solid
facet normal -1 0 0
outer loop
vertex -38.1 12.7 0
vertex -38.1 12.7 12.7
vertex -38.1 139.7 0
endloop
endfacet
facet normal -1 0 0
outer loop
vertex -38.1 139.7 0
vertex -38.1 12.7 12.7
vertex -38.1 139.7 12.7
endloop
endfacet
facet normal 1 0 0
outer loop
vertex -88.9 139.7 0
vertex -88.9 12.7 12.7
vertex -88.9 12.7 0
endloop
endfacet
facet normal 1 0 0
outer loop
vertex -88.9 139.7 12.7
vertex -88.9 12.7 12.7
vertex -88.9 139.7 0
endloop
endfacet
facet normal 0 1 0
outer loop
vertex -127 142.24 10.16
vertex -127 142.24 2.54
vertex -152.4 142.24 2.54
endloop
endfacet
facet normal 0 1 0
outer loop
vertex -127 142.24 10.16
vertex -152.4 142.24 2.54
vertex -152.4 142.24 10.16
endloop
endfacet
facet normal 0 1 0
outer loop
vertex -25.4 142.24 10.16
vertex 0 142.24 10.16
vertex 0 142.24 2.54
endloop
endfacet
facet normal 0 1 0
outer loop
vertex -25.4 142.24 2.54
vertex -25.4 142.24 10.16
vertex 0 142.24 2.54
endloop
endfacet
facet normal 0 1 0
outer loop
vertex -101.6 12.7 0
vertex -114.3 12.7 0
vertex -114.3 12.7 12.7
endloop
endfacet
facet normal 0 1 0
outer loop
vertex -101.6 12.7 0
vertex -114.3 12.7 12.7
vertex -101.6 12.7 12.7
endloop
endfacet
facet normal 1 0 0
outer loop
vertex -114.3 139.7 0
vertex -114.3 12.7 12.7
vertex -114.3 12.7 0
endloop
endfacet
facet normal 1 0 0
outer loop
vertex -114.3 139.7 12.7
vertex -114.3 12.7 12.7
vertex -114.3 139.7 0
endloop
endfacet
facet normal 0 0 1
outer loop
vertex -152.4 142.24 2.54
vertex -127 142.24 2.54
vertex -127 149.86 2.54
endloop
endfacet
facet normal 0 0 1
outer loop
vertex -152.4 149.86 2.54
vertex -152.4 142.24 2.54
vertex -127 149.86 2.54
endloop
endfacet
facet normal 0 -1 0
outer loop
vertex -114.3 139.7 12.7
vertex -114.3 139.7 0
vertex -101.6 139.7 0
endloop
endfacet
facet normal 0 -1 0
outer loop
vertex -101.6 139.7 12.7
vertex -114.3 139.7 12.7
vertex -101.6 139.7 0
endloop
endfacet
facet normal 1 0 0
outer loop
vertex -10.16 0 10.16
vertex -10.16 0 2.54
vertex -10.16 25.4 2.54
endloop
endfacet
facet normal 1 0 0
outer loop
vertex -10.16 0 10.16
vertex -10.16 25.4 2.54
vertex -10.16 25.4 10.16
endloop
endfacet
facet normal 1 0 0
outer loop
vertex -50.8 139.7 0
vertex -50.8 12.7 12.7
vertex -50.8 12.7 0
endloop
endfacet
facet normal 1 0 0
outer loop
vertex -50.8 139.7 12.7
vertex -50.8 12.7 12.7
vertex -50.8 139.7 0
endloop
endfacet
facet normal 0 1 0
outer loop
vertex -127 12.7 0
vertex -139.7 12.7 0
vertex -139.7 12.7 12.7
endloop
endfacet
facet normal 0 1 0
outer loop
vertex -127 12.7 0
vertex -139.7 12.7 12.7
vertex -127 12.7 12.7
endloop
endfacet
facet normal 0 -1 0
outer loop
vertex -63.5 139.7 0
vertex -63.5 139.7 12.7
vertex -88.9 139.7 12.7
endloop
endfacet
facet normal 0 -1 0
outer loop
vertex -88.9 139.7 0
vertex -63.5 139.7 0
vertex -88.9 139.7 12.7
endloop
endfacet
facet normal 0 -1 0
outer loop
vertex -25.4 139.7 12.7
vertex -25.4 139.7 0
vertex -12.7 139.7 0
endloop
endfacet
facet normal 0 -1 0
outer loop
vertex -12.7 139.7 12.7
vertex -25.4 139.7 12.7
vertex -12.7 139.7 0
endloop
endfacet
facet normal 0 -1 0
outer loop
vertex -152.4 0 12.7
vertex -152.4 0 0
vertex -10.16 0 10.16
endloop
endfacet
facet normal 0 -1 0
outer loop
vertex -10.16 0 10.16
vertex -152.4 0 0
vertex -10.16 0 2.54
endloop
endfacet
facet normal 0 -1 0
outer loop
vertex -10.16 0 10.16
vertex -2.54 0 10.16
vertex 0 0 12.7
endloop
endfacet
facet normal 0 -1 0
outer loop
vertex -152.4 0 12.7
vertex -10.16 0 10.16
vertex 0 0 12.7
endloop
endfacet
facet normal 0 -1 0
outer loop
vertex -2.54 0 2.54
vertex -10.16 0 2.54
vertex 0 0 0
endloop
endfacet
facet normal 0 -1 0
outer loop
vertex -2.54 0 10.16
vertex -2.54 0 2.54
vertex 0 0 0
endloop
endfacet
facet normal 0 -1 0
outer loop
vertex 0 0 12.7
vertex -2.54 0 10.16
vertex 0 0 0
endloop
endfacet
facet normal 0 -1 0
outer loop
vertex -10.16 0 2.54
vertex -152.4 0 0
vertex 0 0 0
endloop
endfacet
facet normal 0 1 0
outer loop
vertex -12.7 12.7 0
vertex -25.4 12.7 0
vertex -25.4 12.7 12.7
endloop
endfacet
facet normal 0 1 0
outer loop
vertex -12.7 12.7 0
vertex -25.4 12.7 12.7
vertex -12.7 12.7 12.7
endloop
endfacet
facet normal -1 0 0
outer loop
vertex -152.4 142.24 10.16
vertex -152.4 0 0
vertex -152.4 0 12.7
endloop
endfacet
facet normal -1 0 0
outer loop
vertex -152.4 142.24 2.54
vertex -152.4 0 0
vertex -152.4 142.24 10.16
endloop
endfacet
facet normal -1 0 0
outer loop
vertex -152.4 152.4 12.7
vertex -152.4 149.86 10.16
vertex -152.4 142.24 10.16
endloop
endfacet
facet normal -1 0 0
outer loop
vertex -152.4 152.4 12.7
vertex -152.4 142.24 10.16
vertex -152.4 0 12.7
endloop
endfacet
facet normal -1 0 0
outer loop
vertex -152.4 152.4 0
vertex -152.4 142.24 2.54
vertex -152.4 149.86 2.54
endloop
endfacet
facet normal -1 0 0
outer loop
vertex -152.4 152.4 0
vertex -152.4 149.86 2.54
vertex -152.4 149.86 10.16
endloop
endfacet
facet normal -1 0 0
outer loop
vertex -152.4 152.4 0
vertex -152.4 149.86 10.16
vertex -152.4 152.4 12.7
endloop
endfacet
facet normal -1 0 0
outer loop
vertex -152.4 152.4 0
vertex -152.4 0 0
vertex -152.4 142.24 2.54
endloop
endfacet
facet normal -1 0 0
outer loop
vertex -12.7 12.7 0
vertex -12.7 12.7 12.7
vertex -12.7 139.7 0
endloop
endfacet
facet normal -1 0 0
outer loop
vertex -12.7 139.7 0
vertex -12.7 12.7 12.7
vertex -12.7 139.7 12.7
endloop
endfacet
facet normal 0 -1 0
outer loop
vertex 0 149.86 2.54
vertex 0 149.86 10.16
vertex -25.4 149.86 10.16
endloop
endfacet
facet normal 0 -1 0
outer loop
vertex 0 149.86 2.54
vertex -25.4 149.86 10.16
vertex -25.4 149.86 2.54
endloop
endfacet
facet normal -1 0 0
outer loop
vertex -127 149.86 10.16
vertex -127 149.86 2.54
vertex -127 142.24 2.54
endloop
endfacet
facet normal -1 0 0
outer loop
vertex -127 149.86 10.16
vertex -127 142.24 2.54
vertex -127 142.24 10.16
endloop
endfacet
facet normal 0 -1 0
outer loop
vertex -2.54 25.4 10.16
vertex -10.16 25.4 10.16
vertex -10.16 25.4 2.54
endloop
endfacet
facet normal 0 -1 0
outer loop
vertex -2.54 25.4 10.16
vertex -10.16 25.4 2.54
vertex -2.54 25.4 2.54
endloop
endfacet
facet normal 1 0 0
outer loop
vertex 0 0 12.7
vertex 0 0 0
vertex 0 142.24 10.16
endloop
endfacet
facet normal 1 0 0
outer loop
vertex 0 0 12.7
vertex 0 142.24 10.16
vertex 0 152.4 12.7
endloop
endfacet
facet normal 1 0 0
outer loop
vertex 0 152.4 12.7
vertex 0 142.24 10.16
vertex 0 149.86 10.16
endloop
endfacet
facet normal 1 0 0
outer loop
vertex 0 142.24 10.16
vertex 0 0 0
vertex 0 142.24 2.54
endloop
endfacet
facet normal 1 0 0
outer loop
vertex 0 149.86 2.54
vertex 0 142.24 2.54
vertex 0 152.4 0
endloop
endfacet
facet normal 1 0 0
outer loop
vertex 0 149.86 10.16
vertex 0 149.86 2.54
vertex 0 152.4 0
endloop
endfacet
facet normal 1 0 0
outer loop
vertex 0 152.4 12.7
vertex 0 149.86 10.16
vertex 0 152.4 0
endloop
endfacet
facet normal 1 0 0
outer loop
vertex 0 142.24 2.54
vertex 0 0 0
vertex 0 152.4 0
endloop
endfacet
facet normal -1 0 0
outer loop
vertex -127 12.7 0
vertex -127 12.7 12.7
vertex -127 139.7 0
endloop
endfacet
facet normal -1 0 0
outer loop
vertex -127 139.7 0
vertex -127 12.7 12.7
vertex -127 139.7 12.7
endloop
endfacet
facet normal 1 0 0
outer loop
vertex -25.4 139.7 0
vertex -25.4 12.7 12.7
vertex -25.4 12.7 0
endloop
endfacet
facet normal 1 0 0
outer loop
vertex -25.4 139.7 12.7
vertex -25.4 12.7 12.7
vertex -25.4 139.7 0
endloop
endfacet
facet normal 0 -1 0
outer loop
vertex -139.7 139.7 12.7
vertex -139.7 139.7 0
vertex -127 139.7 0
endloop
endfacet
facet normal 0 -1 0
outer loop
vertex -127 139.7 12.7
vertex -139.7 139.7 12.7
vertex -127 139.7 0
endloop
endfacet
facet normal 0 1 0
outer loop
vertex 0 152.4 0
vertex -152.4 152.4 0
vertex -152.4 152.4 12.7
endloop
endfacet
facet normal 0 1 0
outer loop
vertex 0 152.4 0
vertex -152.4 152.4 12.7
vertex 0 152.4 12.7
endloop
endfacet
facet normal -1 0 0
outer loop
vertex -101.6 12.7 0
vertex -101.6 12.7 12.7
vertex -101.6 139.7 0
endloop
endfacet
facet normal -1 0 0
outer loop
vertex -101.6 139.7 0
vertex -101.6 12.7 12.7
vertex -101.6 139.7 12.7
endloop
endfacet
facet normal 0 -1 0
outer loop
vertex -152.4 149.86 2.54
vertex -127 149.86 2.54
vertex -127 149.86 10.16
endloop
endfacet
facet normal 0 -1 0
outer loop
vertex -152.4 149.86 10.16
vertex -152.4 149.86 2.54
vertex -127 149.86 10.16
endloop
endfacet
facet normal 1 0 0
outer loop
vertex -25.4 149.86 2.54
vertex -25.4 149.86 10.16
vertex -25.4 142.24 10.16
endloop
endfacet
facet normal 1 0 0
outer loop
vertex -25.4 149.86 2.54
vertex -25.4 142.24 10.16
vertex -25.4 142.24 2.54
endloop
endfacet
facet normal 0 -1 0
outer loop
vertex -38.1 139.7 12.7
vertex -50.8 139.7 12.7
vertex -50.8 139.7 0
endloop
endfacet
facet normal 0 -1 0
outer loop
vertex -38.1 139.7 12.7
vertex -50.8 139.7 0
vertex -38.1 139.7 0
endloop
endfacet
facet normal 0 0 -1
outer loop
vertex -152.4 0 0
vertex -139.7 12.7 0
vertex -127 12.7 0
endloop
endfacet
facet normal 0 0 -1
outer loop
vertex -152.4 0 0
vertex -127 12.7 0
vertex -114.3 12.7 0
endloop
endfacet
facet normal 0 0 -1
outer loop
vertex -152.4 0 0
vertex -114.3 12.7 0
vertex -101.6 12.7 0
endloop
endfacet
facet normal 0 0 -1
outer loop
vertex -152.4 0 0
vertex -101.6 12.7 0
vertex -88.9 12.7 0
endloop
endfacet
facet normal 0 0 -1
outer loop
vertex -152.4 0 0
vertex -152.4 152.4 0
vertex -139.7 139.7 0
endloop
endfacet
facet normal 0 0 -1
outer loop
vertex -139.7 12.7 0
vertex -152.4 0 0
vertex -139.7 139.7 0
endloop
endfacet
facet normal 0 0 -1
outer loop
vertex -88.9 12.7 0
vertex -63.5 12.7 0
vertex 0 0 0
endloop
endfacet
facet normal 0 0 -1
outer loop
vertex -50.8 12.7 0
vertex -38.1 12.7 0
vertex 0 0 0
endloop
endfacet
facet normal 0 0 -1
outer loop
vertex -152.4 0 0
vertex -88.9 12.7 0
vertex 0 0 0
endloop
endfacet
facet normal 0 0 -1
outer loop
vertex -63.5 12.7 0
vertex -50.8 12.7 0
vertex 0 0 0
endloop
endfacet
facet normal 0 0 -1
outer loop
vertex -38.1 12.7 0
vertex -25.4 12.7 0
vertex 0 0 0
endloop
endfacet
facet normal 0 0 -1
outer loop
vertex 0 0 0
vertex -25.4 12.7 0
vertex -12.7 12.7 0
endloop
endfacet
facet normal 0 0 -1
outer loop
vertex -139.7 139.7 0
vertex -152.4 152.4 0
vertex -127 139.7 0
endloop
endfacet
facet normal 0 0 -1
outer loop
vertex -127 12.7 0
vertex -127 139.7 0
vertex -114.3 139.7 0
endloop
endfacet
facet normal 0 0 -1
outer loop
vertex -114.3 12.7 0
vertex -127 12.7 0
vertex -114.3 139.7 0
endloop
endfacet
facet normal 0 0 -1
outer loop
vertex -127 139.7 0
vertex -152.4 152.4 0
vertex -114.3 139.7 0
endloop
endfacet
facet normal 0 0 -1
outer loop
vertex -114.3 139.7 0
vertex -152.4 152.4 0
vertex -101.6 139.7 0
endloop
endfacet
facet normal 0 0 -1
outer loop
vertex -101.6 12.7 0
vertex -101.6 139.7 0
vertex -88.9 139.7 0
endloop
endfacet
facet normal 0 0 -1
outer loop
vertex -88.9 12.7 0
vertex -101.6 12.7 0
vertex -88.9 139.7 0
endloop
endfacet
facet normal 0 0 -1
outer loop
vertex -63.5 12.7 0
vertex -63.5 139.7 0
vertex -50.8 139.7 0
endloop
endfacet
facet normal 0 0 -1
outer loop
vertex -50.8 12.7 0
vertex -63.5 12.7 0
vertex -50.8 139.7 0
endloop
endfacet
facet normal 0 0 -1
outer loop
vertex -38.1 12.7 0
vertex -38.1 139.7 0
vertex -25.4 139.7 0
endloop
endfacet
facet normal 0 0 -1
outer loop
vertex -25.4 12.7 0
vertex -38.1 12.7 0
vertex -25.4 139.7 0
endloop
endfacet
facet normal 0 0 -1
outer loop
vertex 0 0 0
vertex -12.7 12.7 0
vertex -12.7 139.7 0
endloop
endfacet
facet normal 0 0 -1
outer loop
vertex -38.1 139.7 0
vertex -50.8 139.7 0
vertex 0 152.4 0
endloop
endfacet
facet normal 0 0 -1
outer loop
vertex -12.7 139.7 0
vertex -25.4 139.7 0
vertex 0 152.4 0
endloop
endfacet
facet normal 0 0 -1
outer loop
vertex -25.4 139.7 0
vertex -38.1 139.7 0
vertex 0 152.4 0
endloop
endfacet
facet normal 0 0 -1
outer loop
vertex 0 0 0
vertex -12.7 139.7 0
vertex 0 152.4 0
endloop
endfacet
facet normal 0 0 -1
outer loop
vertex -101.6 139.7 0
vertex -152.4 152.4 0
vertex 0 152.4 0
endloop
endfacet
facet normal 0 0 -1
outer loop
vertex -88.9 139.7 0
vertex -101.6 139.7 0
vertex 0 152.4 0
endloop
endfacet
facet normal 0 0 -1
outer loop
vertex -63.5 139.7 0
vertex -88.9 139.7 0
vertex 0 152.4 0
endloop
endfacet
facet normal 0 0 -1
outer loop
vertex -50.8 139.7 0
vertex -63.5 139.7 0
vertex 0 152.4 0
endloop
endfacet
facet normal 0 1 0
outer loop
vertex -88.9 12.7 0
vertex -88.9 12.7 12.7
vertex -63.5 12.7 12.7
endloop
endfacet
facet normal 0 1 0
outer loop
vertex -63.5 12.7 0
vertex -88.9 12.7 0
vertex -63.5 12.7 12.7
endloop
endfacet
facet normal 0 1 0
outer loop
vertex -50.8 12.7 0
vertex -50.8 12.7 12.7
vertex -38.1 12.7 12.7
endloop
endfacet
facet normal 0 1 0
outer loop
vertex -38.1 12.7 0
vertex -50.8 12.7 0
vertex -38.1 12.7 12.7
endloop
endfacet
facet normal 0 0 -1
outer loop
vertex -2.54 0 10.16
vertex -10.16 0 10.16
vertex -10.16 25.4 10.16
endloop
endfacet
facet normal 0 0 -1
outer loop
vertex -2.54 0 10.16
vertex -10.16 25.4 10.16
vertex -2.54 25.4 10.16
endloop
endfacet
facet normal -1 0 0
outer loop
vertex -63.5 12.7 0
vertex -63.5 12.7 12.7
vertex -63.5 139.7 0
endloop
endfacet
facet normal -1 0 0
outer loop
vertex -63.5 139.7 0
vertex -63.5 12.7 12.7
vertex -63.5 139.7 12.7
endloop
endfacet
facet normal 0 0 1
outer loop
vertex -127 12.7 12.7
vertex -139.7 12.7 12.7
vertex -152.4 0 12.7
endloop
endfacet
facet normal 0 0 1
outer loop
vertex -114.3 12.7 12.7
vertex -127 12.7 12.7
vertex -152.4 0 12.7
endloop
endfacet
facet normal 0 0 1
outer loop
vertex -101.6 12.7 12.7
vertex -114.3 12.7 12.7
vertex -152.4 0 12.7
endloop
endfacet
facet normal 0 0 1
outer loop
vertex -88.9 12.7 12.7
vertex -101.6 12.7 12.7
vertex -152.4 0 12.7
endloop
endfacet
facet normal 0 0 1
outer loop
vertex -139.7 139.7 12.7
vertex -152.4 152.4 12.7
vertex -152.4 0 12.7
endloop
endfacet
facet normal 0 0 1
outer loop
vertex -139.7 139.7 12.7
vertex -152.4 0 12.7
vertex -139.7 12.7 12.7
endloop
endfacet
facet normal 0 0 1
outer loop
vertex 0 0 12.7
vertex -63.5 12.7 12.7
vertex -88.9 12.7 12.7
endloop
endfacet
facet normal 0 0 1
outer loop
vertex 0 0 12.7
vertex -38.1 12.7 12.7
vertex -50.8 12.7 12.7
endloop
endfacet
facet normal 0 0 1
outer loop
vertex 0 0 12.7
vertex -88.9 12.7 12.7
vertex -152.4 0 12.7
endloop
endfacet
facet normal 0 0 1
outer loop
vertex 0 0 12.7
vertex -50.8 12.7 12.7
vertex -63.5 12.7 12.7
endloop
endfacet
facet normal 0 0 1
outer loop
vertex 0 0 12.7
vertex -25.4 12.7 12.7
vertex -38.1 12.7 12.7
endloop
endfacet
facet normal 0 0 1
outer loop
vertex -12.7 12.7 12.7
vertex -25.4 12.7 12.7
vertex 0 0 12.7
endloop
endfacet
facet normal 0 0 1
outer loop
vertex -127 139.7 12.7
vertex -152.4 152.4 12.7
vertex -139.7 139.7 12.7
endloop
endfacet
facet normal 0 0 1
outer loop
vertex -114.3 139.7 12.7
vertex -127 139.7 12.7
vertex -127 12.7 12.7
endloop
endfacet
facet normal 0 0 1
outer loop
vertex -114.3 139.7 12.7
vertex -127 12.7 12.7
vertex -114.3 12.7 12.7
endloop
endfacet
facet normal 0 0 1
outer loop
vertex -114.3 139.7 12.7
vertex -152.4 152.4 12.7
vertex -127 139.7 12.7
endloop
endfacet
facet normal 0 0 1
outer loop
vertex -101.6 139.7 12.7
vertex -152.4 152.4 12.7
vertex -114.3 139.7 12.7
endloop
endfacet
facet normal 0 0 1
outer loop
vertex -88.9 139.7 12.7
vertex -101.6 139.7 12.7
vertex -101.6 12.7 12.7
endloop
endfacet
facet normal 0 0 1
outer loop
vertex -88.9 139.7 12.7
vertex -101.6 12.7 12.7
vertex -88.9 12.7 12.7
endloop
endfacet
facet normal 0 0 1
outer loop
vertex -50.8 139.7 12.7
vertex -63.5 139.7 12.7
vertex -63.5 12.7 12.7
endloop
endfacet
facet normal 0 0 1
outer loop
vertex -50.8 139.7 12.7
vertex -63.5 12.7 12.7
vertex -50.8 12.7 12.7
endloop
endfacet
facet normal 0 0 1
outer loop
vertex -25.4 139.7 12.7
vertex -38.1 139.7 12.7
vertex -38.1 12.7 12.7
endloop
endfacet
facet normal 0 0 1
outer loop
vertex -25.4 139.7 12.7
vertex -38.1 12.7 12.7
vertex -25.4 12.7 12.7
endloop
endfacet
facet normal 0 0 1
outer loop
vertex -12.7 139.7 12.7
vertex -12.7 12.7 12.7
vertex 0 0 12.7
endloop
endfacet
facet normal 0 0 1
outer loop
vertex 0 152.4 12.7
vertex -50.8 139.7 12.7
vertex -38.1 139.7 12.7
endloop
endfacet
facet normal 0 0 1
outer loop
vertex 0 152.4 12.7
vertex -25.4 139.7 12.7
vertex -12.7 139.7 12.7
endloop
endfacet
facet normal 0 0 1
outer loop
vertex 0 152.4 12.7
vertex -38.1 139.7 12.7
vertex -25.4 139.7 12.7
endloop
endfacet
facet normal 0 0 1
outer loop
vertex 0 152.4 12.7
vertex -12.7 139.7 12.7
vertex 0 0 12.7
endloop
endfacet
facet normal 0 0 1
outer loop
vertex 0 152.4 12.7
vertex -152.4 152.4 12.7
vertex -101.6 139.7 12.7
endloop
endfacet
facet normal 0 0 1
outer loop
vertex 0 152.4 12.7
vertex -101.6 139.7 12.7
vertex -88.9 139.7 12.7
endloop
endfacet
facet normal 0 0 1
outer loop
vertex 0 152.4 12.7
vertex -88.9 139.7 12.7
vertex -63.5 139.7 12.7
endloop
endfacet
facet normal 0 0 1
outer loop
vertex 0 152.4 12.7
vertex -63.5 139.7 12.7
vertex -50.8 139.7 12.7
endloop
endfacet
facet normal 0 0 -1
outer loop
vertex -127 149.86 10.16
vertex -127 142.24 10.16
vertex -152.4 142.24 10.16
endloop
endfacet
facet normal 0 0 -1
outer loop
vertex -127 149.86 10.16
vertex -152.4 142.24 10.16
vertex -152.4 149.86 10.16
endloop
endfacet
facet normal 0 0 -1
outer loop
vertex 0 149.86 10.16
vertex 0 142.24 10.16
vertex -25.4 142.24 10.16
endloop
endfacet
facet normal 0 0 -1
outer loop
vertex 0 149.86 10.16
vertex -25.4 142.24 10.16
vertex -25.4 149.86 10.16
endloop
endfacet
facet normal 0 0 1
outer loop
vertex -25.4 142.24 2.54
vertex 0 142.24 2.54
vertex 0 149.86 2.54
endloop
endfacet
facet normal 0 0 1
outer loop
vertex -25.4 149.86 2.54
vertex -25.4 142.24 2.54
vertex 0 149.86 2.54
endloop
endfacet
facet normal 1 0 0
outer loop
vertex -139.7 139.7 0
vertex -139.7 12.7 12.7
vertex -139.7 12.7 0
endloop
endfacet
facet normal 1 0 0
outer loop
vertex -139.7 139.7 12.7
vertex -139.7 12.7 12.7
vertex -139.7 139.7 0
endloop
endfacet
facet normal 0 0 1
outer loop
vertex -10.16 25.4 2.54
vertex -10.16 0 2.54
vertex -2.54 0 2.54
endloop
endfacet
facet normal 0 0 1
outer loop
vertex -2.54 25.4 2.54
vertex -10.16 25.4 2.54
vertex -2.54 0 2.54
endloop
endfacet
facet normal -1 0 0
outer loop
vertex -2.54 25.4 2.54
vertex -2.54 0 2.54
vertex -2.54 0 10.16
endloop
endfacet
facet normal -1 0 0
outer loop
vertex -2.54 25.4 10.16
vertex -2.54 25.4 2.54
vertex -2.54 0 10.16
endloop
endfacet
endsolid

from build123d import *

# Parameters (mm, degrees)
SKETCH1_W           = 152.4
SKETCH1_H           = 152.4
BOSS_EXTRUDE1_DEPTH = 12.7
SKETCH2_W           = 12.7
SKETCH2_H           = 127
CUT_EXTRUDE1_DEPTH  = 12.7
SKETCH3_W           = 7.62
SKETCH3_H           = 7.62
CUT_EXTRUDE2_DEPTH  = 25.4
SKETCH4_W           = 7.62
SKETCH4_H           = 7.62
CUT_EXTRUDE3_DEPTH  = 25.4
SKETCH5_W           = 7.62
SKETCH5_H           = 7.62
CUT_EXTRUDE4_DEPTH  = 25.4


with BuildPart() as part:
    # Sketch1 → Boss-Extrude1 (new body)
    with BuildSketch(Plane.XY):
        with Locations((-76.2, 76.2)):
            Rectangle(SKETCH1_W, SKETCH1_H)
    extrude(amount=BOSS_EXTRUDE1_DEPTH)

    # Sketch2 → Cut-Extrude1 (cut)
    with BuildSketch(Plane.XY.offset(12.7)):
        with Locations((-133.35, 76.2)):
            Rectangle(SKETCH2_W, SKETCH2_H)
        with Locations((-19.05, 76.2)):
            Rectangle(SKETCH2_W, SKETCH2_H)
        with Locations((-44.45, 76.2)):
            Rectangle(SKETCH2_W, SKETCH2_H)
        with Locations((-107.95, 76.2)):
            Rectangle(SKETCH2_W, SKETCH2_H)
        with Locations((-82.55, 76.2)):
            Rectangle(SKETCH2_W, SKETCH2_H)
        with Locations((-69.85, 76.2)):
            Rectangle(SKETCH2_W, SKETCH2_H)
    extrude(amount=-CUT_EXTRUDE1_DEPTH, mode=Mode.SUBTRACT)

    # Sketch3 → Cut-Extrude2 (cut)
    with BuildSketch(Plane(origin=(0, 0, 0), x_dir=(0, 0, -1), z_dir=(1, 0, 0))):
        with Locations((-6.35, 146.05)):
            Rectangle(SKETCH3_W, SKETCH3_H)
    extrude(amount=-CUT_EXTRUDE2_DEPTH, mode=Mode.SUBTRACT)

    # Sketch4 → Cut-Extrude3 (cut)
    with BuildSketch(Plane.ZY.offset(152.4)):
        with Locations((6.35, 146.05)):
            Rectangle(SKETCH4_W, SKETCH4_H)
    extrude(amount=-CUT_EXTRUDE3_DEPTH, mode=Mode.SUBTRACT)

    # Sketch5 → Cut-Extrude4 (cut)
    with BuildSketch(Plane.XZ):
        with Locations((-6.35, 6.35)):
            Rectangle(SKETCH5_W, SKETCH5_H)
    extrude(amount=-CUT_EXTRUDE4_DEPTH, mode=Mode.SUBTRACT)


solid = part.part
